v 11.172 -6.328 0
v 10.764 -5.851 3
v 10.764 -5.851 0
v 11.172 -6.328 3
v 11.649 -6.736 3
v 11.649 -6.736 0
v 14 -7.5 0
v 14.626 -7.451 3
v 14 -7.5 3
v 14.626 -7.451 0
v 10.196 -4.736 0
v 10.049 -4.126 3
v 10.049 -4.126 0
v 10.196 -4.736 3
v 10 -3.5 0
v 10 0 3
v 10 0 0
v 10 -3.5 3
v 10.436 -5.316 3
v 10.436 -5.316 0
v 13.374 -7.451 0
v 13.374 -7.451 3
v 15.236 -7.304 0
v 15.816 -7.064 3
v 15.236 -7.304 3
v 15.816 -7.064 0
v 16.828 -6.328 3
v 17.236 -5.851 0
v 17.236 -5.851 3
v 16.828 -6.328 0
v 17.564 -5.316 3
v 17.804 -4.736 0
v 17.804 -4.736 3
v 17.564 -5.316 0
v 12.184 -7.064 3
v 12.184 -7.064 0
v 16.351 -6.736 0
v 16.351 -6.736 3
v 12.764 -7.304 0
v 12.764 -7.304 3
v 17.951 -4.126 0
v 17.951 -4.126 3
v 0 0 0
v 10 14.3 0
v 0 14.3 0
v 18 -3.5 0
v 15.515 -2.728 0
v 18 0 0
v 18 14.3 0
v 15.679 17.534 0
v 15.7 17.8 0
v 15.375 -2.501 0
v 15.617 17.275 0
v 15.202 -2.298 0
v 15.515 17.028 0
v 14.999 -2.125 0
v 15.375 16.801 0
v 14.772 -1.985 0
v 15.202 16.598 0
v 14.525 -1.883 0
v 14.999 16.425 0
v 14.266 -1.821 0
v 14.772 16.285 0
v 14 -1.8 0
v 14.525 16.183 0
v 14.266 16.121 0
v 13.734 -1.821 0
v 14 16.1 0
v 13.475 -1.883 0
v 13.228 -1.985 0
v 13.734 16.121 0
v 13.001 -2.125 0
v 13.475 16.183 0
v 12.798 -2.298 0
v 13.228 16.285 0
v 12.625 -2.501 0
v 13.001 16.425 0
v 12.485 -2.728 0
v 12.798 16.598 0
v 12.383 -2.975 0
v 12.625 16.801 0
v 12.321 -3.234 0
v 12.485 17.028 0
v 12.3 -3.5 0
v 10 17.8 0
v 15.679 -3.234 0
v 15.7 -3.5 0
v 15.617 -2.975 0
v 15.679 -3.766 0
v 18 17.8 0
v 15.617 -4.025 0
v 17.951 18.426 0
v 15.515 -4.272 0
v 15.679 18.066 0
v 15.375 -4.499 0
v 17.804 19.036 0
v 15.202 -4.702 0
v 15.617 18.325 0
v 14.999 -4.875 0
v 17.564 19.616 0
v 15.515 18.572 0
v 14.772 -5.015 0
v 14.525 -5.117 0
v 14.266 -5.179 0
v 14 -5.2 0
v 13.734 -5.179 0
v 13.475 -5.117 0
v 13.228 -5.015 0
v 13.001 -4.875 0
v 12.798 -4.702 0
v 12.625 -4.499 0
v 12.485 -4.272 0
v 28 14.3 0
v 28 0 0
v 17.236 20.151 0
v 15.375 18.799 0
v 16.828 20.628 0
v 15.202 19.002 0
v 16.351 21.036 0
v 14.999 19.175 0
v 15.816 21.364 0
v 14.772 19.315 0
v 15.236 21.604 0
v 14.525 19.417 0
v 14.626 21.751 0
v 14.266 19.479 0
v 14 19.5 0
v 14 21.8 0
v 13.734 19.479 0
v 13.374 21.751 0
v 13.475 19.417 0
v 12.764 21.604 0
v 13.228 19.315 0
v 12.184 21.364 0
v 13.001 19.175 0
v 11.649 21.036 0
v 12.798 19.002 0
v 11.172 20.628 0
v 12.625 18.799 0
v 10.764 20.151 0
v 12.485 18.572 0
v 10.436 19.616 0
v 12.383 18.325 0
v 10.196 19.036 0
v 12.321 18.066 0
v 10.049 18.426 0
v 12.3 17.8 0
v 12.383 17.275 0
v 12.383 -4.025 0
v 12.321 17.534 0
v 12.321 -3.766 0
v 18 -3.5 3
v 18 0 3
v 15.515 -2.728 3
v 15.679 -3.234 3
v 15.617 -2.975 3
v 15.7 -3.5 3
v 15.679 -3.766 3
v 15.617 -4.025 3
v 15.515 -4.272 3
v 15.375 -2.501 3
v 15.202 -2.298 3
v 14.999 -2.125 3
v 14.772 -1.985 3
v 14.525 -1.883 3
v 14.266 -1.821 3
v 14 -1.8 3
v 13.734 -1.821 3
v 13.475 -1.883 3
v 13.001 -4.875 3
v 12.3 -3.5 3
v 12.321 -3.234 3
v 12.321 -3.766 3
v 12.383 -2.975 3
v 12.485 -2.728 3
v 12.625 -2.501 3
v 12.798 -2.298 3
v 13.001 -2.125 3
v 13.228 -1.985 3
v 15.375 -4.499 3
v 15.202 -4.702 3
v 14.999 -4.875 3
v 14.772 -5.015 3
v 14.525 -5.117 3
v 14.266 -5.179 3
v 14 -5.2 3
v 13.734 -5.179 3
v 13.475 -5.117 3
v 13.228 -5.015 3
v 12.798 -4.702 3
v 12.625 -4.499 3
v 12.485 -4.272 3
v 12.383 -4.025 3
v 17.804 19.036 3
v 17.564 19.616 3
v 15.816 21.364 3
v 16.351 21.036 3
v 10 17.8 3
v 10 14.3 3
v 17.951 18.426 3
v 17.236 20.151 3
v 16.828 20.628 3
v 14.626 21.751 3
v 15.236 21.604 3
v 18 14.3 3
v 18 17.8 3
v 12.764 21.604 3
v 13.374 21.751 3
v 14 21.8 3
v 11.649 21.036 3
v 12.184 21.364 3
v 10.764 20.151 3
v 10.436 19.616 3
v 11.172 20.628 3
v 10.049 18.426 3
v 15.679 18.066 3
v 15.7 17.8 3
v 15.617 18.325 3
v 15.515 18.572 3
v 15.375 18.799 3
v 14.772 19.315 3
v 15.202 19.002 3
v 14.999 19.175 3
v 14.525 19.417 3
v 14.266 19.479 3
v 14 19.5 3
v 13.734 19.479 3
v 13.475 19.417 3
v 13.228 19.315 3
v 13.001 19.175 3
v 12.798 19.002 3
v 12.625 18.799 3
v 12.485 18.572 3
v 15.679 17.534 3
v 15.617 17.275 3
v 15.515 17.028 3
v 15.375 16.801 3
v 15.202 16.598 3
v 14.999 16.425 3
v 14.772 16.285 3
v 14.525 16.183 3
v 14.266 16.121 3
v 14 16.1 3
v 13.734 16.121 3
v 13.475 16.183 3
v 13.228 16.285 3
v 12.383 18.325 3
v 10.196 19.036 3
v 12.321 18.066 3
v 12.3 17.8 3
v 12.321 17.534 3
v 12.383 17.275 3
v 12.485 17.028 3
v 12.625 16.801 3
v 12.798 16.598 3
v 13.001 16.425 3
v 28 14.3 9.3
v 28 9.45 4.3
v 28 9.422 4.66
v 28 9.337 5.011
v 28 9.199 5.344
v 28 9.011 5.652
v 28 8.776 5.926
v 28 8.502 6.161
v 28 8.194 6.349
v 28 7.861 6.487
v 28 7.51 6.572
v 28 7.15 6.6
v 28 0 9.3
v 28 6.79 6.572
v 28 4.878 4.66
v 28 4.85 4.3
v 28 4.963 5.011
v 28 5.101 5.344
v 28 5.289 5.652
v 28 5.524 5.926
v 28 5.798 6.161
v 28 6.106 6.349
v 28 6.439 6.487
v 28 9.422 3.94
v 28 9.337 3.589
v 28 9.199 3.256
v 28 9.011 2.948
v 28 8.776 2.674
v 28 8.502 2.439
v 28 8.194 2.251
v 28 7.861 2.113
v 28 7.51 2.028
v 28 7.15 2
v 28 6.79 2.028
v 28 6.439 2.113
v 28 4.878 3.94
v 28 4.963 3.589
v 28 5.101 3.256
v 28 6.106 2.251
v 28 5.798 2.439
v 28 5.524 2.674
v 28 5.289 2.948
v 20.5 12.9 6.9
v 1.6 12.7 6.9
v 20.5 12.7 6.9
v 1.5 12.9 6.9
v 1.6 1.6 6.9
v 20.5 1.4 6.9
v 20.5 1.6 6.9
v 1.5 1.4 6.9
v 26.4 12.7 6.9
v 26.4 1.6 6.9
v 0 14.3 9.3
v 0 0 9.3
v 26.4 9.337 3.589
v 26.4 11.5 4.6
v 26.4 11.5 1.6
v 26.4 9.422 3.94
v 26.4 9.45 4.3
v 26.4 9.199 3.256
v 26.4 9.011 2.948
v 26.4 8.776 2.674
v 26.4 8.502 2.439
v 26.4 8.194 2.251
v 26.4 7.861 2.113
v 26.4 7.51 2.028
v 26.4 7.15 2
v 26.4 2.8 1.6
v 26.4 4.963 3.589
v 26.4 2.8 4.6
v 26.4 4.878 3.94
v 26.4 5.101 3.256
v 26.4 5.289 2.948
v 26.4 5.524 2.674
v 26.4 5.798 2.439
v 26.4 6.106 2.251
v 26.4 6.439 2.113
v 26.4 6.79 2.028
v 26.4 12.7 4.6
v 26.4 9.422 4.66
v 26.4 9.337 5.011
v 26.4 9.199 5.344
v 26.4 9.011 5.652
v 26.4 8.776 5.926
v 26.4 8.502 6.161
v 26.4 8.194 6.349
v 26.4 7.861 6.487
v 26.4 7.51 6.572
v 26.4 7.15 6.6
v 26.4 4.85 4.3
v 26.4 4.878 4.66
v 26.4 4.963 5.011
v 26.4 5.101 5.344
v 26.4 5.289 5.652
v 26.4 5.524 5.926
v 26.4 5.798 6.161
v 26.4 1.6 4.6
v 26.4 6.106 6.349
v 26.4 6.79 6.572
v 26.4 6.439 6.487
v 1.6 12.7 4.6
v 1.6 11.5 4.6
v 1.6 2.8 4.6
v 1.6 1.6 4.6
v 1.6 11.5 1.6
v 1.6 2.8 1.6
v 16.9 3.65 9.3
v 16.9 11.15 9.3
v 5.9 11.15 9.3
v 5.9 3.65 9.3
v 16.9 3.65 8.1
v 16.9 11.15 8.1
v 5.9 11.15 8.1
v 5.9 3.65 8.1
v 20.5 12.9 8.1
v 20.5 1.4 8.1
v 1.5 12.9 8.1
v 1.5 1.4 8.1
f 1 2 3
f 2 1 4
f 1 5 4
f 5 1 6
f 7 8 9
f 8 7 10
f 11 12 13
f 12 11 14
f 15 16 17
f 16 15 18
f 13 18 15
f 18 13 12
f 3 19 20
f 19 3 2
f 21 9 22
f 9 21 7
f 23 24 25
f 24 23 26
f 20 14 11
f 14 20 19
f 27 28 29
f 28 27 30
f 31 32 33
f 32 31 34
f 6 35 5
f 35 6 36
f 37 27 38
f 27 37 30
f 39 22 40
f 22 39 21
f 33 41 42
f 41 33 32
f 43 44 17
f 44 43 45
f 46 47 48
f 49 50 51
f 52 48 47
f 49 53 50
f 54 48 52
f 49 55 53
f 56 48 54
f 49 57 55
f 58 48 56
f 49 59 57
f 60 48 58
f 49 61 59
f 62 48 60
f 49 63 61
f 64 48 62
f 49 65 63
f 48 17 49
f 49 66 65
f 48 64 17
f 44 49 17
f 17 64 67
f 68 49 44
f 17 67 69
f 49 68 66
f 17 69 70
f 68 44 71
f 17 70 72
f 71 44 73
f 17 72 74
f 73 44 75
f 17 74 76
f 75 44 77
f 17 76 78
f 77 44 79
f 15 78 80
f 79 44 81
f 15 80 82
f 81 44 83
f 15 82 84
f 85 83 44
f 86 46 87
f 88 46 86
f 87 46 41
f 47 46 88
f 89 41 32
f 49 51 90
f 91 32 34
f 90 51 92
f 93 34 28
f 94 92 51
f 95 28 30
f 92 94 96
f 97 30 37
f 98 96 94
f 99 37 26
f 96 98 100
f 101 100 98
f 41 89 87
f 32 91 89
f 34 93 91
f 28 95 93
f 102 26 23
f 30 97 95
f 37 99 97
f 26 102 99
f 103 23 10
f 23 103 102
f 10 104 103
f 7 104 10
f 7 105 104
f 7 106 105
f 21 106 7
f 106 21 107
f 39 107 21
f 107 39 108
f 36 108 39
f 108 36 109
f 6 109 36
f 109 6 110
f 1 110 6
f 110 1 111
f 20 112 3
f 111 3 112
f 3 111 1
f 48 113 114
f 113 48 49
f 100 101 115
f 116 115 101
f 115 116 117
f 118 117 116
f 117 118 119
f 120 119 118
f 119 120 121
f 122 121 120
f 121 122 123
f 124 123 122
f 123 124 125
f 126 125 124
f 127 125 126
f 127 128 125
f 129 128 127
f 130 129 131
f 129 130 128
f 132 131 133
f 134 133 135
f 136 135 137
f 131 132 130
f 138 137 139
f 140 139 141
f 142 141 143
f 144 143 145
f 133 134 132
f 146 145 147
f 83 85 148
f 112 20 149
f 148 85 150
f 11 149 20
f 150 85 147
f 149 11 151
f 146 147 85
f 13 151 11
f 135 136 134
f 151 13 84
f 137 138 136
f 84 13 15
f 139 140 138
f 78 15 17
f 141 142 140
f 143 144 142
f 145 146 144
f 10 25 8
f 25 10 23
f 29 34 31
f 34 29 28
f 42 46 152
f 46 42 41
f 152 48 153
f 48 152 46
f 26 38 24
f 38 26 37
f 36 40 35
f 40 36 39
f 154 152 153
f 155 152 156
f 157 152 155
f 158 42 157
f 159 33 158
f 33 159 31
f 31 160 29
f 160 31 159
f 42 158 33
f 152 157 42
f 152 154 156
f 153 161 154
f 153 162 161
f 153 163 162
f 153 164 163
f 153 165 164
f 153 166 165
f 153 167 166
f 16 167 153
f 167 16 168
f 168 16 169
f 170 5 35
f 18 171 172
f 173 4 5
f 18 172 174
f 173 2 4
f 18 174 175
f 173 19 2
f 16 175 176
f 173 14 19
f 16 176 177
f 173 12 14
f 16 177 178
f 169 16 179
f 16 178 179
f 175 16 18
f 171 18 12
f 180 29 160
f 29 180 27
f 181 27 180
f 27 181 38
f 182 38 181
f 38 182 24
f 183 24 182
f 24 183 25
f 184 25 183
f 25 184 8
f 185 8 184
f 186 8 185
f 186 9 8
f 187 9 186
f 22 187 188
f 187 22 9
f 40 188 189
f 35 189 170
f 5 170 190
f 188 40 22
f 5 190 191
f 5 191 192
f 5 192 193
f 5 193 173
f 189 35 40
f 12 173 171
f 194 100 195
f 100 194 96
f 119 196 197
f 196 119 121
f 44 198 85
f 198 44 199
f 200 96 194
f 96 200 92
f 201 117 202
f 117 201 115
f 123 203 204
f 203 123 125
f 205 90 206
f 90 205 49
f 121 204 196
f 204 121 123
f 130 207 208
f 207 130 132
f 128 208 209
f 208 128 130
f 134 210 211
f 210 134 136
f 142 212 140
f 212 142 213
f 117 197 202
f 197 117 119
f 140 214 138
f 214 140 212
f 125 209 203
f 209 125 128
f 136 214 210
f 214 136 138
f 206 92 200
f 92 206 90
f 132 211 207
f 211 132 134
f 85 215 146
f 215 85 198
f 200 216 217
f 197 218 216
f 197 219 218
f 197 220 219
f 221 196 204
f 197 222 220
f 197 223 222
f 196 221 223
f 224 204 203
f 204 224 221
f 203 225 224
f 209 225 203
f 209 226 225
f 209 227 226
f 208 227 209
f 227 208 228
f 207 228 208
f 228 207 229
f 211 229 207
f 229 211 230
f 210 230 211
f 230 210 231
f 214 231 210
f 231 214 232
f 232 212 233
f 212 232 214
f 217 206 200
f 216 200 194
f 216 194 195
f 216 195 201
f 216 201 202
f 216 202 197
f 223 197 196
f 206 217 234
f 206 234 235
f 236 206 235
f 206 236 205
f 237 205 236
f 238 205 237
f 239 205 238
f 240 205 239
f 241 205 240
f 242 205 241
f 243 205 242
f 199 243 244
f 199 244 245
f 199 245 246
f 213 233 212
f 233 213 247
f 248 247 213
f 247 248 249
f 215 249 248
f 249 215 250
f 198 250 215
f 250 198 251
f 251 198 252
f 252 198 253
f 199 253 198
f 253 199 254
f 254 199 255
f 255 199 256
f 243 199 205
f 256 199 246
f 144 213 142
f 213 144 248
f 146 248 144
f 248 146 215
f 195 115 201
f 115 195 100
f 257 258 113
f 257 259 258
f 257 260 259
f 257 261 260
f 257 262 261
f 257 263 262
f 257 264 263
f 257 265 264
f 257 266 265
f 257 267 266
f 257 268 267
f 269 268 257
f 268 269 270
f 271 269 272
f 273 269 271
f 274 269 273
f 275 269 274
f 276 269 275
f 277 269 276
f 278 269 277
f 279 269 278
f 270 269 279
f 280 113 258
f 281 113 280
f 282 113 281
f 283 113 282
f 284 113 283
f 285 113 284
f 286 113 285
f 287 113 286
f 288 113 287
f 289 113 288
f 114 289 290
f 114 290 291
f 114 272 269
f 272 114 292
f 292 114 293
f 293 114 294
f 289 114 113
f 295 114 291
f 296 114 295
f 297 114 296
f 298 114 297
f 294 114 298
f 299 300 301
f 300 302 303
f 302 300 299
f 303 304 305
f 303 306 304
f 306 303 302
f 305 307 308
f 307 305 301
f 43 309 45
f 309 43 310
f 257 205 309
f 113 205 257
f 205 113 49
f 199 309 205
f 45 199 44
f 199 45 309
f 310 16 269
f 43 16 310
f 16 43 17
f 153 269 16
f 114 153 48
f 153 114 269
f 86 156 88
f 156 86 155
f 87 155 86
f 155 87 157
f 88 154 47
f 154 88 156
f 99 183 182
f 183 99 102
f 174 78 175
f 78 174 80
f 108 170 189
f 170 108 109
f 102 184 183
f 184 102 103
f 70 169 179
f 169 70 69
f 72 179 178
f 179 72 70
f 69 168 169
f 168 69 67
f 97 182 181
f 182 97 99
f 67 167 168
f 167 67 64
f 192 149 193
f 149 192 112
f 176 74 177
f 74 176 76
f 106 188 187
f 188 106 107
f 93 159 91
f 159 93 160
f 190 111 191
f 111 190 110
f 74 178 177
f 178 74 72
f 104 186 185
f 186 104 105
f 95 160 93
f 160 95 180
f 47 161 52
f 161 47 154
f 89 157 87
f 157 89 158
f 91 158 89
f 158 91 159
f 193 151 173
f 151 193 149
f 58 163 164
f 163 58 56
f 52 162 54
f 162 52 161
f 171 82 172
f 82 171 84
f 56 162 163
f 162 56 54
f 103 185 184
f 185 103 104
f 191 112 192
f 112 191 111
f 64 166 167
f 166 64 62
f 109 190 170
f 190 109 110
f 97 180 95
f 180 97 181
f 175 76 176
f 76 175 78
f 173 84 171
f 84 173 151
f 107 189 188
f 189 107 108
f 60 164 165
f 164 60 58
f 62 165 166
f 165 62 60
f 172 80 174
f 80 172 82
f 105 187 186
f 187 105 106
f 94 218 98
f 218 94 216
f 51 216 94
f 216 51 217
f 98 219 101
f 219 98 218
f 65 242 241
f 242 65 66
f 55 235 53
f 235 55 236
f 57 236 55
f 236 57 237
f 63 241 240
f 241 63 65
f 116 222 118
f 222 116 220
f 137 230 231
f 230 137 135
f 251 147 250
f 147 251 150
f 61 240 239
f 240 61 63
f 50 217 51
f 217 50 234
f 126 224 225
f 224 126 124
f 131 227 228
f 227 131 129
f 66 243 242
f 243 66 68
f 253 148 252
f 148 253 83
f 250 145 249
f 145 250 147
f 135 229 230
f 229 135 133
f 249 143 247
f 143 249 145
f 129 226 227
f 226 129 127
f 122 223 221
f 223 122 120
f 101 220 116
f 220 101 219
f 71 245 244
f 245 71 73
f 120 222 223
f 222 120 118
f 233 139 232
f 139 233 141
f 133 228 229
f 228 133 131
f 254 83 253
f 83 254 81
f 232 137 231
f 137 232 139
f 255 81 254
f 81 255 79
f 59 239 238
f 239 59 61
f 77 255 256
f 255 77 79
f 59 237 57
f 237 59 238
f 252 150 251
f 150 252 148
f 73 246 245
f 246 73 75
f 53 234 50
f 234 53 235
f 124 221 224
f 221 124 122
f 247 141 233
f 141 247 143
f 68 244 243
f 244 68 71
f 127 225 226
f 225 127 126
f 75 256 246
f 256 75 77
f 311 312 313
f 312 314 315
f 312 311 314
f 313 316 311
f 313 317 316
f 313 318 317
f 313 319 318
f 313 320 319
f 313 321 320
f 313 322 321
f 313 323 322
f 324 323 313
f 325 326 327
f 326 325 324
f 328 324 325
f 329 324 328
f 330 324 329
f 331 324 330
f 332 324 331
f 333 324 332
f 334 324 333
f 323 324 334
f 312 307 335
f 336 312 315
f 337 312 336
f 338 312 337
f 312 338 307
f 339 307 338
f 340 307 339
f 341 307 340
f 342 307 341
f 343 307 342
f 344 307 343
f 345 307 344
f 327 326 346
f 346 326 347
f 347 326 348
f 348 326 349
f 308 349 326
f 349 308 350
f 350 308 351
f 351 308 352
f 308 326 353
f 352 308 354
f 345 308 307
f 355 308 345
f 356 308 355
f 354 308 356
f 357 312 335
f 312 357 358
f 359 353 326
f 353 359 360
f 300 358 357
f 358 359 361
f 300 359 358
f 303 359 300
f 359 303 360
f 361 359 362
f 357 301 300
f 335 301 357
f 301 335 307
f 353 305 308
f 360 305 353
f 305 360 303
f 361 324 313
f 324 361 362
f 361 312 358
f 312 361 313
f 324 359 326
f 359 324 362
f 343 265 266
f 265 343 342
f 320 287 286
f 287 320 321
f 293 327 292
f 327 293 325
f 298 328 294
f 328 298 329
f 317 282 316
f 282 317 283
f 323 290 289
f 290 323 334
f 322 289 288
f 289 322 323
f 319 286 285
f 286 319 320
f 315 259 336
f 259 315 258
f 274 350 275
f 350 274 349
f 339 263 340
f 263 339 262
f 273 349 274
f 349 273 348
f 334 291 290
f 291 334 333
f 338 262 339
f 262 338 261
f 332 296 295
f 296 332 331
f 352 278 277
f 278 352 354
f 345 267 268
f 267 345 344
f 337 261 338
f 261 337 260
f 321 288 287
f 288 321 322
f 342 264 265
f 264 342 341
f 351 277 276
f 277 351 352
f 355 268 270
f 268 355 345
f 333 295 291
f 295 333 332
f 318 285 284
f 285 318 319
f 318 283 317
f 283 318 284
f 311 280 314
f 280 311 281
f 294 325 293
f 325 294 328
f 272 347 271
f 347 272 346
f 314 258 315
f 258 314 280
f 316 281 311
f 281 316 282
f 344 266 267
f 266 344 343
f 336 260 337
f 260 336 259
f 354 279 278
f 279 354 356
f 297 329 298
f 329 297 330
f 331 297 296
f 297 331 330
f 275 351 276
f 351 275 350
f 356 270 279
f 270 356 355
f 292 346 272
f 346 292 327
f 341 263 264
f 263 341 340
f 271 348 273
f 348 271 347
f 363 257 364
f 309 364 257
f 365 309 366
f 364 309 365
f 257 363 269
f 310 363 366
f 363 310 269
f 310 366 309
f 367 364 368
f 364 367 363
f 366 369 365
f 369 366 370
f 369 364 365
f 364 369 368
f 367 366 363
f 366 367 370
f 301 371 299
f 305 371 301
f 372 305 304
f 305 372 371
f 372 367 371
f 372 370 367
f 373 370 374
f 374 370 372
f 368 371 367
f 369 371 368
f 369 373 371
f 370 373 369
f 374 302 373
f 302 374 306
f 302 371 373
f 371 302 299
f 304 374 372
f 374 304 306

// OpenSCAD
// =====================================================================
//  TESTINA PER IL SENSORE UV (VEML6075, scheda CJMCU-6075 18,2 x 10,5 x 2)
//  Piccola scatola separata, da fissare all'aperto con il sensore verso il
//  cielo e collegare alla scatola principale con un cavetto a 4 fili
//  (3,3 V, GND, SCL, SDA) che entra dal pressacavo.
//  Tre pezzi:
//    - tazza (cup): contiene la scheda, con due alette per le viti M3;
//    - coperchio (lid): ha la finestra sopra il sensore;
//    - finestra: un pezzetto di materiale TRASPARENTE AGLI UV 19 x 11,5,
//      spesso fino a 1 mm (PMMA tipo UV-T, oppure velo di PTFE), che NON si
//      stampa: si incolla con silicone sotto la finestra del coperchio.
//  Montaggio: salda i 4 fili sui pin (tagliando la barretta), metti la
//  scheda con le scritte in basso e il sensore in alto, sigilla con
//  silicone l'uscita del cavo, incolla la finestra, poi il coperchio.
//  ATTENZIONE: la posizione del chip sulla scheda non l'ho vista (la foto
//  mostrava il retro): guarda dove sta e regola win_c (centro della
//  finestra, in mm dallo spigolo in basso a sinistra della scheda).
// =====================================================================

part = "assembly";   // [assembly, cup, lid, print]

board  = [18.2, 10.5, 2];     // scheda misurata con il calibro: lunghezza (con i pin a destra), larghezza, spessore
clr    = 0.3;             // gioco intorno alla scheda
wall   = 1.6;
floor_t = 1.6;
under  = 3;               // spazio sotto la scheda per le saldature dei fili
rail   = 1.2;             // appoggio della scheda sui due lati lunghi
free_r = 6;               // spazio a destra della scheda per i fili
cable_d = 4.6;            // cavetto a 4 fili, diametro
win    = [11, 7.5];       // apertura della finestra
win_c  = [9.5, 5.5];      // centro dell'apertura, dallo spigolo in basso a sinistra della scheda
pane   = [19, 11.5];       // il pezzetto trasparente agli UV
pane_t = 1.2;             // profondita' della sede del vetrino
lid_t  = 2.4;
ear_r  = 4;  ear_d = 3.4; ear_t = 3;   // alette per le viti M3
$fn = 40;

px = board[0] + 2*clr;                // pocket X della scheda
ox = px + free_r + 2*wall;            // esterno X
oy = board[1] + 2*clr + 2*wall;       // esterno Y
h  = floor_t + under + board[2] + clr; // altezza della tazza
bx = wall + clr;                      // dove comincia la scheda (X)
by = wall + clr;                      // e (Y)

module cup() {
    difference() {
        union() {
            cube([ox, oy, h]);
            for (s = [0, 1]) hull() {        // alette sui due lati lunghi, a meta'
                translate([ox/2 - ear_r, s == 0 ? 1 : oy - 1, 0]) cube([2*ear_r, 0.01, ear_t]);
                translate([ox/2, s == 0 ? -3.5 : oy + 3.5, 0]) cylinder(r = ear_r, h = ear_t);
            }
        }
        // tasca superiore (scheda + spazio fili)
        translate([wall, wall, floor_t + under]) cube([ox - 2*wall, oy - 2*wall, h]);
        // cavita' sotto la scheda per le saldature: lascia gli appoggi di 'rail' sui lati lunghi
        translate([wall, wall + rail, floor_t]) cube([ox - 2*wall, oy - 2*wall - 2*rail, under + 0.01]);
        // uscita del cavo nella parete destra
        translate([ox - wall - 1, oy/2, floor_t + 2.7]) rotate([0, 90, 0]) cylinder(d = cable_d, h = wall + 2);
        // viti M3
        for (y = [-3.5, oy + 3.5]) translate([ox/2, y, -1]) cylinder(d = ear_d, h = ear_t + 2);
    }
}
module lid() {
    difference() {
        translate([0, 0, h]) cube([ox, oy, lid_t]);
        // apertura sopra il sensore
        translate([bx + win_c[0] - win[0]/2, by + win_c[1] - win[1]/2, h - 1])
            cube([win[0], win[1], lid_t + 2]);
        // sede del pezzetto trasparente, sotto
        translate([bx + board[0]/2 - pane[0]/2, oy/2 - pane[1]/2, h - 0.01]) cube([pane[0], pane[1], pane_t + 0.01]);
    }
}
module lid_print() { translate([0, 0, h + lid_t]) mirror([0, 0, 1]) lid(); }   // a faccia in giu', senza supporti
module board_dummy() { color("Green") translate([bx, by, floor_t + under]) cube(board); }

if (part == "cup") cup();
else if (part == "lid") lid_print();
else if (part == "print") { cup(); translate([ox + 12, 0, -h]) lid_print(); }
else { cup(); color("SteelBlue") lid(); %board_dummy(); }

echo(str("testina UV: ", ox, " x ", oy, " mm (", oy + 2*(3.5 + ear_r), " con le alette) x ", h + lid_t, " mm"));
